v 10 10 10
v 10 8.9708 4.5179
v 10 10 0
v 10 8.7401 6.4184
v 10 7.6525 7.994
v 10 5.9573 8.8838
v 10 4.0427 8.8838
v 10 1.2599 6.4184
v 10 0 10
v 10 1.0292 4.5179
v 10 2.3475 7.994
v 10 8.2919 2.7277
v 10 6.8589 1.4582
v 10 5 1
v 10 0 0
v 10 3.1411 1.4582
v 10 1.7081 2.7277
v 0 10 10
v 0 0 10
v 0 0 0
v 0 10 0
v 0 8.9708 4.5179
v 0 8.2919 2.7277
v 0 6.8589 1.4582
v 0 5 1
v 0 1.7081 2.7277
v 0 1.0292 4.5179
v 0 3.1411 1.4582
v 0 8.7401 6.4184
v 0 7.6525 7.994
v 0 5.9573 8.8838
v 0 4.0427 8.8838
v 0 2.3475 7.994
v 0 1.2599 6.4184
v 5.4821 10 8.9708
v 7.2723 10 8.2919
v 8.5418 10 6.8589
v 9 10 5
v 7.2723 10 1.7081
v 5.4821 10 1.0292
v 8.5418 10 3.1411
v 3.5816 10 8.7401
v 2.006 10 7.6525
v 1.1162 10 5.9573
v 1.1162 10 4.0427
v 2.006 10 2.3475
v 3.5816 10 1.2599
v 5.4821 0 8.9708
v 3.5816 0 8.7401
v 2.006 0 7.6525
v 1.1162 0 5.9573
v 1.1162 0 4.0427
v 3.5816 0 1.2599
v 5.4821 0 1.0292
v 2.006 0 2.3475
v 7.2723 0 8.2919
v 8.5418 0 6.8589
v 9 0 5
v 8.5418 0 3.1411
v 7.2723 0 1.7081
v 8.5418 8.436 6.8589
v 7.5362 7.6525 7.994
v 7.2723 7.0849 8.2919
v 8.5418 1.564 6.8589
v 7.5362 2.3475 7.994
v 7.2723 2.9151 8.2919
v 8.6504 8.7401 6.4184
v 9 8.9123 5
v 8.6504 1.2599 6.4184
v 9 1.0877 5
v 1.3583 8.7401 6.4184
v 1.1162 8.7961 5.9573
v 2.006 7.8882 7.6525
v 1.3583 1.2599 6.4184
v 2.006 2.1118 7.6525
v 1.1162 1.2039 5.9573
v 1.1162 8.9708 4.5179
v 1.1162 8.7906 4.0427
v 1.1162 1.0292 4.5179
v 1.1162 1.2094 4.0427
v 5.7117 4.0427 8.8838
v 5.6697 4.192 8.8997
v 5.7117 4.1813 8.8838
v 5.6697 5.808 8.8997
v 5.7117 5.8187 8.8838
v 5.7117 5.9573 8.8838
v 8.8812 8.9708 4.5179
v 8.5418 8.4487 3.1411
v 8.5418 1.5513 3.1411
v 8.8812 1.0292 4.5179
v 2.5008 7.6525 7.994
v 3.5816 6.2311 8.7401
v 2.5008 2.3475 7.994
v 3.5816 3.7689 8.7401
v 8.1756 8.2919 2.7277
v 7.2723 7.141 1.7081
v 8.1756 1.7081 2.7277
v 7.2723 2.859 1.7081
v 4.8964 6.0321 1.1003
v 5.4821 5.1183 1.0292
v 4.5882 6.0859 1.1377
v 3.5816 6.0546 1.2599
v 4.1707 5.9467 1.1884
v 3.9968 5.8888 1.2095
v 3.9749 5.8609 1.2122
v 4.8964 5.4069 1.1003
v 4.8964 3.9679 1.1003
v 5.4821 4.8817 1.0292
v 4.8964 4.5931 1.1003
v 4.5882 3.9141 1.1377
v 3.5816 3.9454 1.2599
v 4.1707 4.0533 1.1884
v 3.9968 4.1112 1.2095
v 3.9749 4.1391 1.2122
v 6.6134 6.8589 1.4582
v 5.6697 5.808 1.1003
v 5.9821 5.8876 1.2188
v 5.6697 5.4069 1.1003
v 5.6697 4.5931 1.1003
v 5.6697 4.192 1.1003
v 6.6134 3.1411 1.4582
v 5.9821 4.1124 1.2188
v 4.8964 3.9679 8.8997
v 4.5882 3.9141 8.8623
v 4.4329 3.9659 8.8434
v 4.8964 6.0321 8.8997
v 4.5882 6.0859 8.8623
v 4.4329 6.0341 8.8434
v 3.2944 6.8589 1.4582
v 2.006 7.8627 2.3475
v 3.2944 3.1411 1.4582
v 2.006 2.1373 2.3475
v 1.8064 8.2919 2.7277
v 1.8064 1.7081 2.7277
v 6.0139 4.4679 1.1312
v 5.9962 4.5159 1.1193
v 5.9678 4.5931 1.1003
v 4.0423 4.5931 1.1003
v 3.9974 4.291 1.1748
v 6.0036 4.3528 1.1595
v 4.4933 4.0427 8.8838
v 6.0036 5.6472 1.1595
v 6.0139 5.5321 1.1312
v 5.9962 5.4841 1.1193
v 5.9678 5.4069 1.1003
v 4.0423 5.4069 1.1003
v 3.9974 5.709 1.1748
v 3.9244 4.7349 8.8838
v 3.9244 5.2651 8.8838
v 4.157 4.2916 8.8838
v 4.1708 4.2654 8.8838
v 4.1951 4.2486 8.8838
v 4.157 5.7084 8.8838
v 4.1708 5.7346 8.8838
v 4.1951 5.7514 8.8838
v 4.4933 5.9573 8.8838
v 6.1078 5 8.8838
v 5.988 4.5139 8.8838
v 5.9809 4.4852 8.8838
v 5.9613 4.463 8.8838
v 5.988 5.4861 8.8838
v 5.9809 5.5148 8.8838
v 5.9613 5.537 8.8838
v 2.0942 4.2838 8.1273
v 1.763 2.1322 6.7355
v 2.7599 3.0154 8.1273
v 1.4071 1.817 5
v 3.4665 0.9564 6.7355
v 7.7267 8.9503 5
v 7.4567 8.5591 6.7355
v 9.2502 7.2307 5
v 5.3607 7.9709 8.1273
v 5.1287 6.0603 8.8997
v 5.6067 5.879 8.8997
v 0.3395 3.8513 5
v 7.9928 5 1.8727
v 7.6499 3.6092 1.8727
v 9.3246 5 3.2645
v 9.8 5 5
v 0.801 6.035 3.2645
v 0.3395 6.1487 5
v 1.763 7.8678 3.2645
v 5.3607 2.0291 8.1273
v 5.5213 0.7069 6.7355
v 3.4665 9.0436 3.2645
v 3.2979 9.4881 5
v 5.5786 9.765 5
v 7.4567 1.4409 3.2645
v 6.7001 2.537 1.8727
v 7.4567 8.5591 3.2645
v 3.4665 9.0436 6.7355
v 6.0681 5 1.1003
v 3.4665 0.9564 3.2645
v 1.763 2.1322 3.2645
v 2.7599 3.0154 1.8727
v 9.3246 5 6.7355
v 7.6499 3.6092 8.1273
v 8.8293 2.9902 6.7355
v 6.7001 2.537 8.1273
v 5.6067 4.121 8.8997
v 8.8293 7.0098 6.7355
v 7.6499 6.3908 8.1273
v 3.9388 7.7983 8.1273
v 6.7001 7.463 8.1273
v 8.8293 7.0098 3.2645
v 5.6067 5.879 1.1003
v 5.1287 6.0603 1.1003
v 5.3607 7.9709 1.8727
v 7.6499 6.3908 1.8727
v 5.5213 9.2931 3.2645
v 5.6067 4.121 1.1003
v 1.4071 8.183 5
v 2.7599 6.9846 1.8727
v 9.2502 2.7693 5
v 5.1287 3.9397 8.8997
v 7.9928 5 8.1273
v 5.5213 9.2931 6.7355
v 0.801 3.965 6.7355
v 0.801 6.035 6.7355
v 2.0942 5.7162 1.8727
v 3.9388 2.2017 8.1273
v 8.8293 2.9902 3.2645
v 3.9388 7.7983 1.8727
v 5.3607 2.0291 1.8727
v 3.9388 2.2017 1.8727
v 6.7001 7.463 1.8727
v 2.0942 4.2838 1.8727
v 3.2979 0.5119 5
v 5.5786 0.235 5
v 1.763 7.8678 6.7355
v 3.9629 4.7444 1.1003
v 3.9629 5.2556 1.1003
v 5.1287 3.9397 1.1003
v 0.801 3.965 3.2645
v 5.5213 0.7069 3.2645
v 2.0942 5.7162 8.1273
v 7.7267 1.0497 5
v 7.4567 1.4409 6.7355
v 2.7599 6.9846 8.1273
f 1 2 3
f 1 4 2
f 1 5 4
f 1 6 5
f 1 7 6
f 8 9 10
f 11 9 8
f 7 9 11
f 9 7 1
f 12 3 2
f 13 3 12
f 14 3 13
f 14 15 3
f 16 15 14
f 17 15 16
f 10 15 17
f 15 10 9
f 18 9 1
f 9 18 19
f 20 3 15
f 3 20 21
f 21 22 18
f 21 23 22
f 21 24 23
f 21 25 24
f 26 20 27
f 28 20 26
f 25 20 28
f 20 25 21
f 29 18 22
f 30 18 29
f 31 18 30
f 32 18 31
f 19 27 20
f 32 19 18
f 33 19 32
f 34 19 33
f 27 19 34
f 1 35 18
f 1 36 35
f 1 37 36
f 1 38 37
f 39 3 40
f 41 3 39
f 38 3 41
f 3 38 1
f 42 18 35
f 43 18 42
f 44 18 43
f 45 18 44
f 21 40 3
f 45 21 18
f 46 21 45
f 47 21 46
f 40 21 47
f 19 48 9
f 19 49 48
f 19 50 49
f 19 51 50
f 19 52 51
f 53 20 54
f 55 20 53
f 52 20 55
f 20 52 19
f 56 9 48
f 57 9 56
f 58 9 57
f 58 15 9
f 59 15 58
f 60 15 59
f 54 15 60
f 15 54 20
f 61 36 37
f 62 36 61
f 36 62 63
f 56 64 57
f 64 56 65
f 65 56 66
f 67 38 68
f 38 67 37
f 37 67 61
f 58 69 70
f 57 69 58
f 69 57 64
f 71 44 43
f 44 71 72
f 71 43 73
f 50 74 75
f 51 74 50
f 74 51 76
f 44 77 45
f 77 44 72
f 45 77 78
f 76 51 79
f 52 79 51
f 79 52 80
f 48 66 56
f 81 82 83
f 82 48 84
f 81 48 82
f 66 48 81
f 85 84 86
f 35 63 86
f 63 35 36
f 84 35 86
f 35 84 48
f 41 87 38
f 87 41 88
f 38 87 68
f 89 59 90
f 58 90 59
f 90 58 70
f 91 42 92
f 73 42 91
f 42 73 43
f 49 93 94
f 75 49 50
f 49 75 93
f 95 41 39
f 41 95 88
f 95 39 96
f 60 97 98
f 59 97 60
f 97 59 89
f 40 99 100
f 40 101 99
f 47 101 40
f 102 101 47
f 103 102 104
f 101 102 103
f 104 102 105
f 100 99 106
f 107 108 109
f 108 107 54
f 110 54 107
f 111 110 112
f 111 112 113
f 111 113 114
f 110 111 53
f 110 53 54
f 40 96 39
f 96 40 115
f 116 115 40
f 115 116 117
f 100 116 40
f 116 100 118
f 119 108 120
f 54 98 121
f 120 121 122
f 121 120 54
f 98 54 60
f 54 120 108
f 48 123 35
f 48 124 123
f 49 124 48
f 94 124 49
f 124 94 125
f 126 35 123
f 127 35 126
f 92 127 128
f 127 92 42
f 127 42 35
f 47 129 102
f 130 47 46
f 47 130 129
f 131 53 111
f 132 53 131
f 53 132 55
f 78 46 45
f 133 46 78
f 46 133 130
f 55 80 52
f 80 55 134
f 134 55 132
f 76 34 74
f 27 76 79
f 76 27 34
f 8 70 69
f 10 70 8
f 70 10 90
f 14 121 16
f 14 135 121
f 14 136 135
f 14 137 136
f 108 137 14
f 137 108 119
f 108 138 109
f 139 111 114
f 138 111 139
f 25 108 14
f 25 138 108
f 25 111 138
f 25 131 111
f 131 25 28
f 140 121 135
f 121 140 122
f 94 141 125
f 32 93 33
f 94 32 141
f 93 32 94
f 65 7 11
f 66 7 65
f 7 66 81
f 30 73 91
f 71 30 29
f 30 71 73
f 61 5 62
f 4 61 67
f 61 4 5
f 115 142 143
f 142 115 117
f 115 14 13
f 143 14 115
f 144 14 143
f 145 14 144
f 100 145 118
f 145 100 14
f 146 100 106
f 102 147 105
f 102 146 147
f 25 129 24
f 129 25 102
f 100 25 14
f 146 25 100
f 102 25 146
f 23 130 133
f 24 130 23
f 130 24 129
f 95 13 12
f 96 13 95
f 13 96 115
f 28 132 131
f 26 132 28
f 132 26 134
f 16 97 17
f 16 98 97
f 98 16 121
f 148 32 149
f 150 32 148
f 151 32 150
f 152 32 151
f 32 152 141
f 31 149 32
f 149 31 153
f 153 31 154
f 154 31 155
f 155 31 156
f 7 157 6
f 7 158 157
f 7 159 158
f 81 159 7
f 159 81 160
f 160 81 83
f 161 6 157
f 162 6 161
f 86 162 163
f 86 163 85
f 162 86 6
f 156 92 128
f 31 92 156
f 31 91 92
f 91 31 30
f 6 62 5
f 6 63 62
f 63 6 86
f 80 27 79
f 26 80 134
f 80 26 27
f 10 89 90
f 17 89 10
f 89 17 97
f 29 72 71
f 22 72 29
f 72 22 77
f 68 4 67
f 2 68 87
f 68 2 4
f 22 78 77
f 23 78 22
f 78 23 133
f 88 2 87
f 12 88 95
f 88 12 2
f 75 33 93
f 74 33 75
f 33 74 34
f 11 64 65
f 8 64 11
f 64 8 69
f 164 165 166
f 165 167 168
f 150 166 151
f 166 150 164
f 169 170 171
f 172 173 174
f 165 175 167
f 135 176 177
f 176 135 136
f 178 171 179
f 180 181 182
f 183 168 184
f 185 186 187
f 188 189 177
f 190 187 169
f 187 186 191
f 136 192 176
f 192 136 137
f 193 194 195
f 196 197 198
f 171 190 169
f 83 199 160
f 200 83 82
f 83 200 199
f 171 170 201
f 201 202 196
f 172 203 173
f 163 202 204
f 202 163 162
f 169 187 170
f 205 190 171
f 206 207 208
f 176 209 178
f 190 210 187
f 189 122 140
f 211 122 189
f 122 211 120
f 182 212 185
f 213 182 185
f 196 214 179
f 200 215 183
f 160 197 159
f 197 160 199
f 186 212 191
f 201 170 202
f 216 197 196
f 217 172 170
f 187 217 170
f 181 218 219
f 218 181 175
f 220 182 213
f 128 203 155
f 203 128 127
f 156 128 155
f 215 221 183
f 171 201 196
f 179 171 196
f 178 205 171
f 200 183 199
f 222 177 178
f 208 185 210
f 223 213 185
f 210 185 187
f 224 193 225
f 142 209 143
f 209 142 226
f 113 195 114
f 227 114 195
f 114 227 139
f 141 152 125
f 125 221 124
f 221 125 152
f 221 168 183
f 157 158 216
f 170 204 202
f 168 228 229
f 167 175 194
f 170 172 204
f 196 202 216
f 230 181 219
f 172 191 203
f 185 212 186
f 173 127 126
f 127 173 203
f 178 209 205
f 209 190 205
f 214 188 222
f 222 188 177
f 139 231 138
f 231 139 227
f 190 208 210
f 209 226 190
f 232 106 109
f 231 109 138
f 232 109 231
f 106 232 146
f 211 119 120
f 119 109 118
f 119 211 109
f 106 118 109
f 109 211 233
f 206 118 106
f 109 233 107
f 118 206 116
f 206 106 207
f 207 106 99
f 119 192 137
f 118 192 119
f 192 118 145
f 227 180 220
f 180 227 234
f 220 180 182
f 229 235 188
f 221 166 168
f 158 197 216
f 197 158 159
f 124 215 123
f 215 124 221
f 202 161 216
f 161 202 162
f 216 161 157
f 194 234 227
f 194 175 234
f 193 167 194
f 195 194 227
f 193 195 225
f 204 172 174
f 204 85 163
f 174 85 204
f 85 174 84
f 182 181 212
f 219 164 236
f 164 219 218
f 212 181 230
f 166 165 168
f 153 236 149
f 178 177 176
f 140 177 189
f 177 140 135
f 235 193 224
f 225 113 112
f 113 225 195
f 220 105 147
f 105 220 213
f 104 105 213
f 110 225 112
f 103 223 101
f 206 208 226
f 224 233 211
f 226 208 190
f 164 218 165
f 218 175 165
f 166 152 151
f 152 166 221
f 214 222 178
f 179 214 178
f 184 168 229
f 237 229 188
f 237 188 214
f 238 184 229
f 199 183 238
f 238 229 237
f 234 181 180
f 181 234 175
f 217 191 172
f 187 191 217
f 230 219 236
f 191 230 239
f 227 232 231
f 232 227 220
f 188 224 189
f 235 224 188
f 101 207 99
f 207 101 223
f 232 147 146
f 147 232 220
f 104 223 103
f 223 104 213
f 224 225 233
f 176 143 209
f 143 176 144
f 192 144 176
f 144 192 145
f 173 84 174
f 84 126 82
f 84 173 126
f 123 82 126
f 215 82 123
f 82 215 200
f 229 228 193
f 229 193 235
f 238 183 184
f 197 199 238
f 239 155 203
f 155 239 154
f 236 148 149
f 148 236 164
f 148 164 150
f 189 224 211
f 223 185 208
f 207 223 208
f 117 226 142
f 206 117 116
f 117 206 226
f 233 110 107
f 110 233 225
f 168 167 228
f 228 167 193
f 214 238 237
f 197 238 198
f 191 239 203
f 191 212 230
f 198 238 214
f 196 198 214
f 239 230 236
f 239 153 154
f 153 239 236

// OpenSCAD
difference(){
 cube([10,10,10],centre=true);
rotate([90,0,0])
translate([5,5,-10])
cylinder(h=12,r=4,centre=true);
rotate([0,90,0])
translate([-5,5,0])
cylinder(h=12,r=4,cenre=true);

}
translate([5,5,5])
    scale([1.2,1.2,1])
sphere(r=4);
